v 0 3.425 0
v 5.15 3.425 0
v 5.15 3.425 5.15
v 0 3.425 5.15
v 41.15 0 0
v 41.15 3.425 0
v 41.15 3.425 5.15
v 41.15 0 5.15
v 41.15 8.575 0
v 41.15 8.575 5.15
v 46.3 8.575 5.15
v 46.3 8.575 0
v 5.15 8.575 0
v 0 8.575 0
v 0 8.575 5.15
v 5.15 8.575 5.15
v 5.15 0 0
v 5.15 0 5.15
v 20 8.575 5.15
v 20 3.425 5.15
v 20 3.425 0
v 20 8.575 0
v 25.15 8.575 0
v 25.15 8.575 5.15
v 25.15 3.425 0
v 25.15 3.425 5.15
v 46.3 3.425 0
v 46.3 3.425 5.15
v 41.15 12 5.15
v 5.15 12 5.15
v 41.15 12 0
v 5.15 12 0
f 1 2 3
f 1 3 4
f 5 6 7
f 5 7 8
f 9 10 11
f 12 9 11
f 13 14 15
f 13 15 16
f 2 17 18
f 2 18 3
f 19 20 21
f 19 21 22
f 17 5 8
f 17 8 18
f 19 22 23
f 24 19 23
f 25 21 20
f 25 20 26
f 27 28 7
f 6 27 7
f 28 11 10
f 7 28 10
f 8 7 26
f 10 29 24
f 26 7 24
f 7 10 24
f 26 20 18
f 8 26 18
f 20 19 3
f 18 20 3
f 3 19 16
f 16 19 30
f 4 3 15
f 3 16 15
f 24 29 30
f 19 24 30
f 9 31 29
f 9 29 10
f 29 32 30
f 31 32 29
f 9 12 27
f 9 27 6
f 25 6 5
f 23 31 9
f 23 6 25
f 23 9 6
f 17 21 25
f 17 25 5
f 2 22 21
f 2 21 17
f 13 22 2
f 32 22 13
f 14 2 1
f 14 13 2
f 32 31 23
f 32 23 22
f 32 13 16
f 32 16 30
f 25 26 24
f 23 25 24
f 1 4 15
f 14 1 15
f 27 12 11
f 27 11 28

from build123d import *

# Parameters (mm, degrees)
BOSS_EXTRUDE1_DEPTH = 5.15
SKETCH3_W           = 5.15
SKETCH3_H           = 5.15
CUT_EXTRUDE1_DEPTH  = 6.15


with BuildPart() as part:
    # Sketch2 → Boss-Extrude1 (new body)
    with BuildSketch(Plane.XY):
        Polygon((0, 3.425), (0, 8.575), (5.15, 8.575), (5.15, 12), (41.15, 12), (41.15, 8.575), (46.3, 8.575), (46.3, 3.425), (41.15, 3.425), (41.15, 0), (5.15, 0), (5.15, 3.425), align=None)
    extrude(amount=BOSS_EXTRUDE1_DEPTH)

    # Sketch3 → Cut-Extrude1 (cut, through all)
    with BuildSketch(Plane.XY.offset(5.15)):
        with Locations((22.575, 6)):
            Rectangle(SKETCH3_W, SKETCH3_H)
    extrude(amount=-CUT_EXTRUDE1_DEPTH, mode=Mode.SUBTRACT)


solid = part.part
